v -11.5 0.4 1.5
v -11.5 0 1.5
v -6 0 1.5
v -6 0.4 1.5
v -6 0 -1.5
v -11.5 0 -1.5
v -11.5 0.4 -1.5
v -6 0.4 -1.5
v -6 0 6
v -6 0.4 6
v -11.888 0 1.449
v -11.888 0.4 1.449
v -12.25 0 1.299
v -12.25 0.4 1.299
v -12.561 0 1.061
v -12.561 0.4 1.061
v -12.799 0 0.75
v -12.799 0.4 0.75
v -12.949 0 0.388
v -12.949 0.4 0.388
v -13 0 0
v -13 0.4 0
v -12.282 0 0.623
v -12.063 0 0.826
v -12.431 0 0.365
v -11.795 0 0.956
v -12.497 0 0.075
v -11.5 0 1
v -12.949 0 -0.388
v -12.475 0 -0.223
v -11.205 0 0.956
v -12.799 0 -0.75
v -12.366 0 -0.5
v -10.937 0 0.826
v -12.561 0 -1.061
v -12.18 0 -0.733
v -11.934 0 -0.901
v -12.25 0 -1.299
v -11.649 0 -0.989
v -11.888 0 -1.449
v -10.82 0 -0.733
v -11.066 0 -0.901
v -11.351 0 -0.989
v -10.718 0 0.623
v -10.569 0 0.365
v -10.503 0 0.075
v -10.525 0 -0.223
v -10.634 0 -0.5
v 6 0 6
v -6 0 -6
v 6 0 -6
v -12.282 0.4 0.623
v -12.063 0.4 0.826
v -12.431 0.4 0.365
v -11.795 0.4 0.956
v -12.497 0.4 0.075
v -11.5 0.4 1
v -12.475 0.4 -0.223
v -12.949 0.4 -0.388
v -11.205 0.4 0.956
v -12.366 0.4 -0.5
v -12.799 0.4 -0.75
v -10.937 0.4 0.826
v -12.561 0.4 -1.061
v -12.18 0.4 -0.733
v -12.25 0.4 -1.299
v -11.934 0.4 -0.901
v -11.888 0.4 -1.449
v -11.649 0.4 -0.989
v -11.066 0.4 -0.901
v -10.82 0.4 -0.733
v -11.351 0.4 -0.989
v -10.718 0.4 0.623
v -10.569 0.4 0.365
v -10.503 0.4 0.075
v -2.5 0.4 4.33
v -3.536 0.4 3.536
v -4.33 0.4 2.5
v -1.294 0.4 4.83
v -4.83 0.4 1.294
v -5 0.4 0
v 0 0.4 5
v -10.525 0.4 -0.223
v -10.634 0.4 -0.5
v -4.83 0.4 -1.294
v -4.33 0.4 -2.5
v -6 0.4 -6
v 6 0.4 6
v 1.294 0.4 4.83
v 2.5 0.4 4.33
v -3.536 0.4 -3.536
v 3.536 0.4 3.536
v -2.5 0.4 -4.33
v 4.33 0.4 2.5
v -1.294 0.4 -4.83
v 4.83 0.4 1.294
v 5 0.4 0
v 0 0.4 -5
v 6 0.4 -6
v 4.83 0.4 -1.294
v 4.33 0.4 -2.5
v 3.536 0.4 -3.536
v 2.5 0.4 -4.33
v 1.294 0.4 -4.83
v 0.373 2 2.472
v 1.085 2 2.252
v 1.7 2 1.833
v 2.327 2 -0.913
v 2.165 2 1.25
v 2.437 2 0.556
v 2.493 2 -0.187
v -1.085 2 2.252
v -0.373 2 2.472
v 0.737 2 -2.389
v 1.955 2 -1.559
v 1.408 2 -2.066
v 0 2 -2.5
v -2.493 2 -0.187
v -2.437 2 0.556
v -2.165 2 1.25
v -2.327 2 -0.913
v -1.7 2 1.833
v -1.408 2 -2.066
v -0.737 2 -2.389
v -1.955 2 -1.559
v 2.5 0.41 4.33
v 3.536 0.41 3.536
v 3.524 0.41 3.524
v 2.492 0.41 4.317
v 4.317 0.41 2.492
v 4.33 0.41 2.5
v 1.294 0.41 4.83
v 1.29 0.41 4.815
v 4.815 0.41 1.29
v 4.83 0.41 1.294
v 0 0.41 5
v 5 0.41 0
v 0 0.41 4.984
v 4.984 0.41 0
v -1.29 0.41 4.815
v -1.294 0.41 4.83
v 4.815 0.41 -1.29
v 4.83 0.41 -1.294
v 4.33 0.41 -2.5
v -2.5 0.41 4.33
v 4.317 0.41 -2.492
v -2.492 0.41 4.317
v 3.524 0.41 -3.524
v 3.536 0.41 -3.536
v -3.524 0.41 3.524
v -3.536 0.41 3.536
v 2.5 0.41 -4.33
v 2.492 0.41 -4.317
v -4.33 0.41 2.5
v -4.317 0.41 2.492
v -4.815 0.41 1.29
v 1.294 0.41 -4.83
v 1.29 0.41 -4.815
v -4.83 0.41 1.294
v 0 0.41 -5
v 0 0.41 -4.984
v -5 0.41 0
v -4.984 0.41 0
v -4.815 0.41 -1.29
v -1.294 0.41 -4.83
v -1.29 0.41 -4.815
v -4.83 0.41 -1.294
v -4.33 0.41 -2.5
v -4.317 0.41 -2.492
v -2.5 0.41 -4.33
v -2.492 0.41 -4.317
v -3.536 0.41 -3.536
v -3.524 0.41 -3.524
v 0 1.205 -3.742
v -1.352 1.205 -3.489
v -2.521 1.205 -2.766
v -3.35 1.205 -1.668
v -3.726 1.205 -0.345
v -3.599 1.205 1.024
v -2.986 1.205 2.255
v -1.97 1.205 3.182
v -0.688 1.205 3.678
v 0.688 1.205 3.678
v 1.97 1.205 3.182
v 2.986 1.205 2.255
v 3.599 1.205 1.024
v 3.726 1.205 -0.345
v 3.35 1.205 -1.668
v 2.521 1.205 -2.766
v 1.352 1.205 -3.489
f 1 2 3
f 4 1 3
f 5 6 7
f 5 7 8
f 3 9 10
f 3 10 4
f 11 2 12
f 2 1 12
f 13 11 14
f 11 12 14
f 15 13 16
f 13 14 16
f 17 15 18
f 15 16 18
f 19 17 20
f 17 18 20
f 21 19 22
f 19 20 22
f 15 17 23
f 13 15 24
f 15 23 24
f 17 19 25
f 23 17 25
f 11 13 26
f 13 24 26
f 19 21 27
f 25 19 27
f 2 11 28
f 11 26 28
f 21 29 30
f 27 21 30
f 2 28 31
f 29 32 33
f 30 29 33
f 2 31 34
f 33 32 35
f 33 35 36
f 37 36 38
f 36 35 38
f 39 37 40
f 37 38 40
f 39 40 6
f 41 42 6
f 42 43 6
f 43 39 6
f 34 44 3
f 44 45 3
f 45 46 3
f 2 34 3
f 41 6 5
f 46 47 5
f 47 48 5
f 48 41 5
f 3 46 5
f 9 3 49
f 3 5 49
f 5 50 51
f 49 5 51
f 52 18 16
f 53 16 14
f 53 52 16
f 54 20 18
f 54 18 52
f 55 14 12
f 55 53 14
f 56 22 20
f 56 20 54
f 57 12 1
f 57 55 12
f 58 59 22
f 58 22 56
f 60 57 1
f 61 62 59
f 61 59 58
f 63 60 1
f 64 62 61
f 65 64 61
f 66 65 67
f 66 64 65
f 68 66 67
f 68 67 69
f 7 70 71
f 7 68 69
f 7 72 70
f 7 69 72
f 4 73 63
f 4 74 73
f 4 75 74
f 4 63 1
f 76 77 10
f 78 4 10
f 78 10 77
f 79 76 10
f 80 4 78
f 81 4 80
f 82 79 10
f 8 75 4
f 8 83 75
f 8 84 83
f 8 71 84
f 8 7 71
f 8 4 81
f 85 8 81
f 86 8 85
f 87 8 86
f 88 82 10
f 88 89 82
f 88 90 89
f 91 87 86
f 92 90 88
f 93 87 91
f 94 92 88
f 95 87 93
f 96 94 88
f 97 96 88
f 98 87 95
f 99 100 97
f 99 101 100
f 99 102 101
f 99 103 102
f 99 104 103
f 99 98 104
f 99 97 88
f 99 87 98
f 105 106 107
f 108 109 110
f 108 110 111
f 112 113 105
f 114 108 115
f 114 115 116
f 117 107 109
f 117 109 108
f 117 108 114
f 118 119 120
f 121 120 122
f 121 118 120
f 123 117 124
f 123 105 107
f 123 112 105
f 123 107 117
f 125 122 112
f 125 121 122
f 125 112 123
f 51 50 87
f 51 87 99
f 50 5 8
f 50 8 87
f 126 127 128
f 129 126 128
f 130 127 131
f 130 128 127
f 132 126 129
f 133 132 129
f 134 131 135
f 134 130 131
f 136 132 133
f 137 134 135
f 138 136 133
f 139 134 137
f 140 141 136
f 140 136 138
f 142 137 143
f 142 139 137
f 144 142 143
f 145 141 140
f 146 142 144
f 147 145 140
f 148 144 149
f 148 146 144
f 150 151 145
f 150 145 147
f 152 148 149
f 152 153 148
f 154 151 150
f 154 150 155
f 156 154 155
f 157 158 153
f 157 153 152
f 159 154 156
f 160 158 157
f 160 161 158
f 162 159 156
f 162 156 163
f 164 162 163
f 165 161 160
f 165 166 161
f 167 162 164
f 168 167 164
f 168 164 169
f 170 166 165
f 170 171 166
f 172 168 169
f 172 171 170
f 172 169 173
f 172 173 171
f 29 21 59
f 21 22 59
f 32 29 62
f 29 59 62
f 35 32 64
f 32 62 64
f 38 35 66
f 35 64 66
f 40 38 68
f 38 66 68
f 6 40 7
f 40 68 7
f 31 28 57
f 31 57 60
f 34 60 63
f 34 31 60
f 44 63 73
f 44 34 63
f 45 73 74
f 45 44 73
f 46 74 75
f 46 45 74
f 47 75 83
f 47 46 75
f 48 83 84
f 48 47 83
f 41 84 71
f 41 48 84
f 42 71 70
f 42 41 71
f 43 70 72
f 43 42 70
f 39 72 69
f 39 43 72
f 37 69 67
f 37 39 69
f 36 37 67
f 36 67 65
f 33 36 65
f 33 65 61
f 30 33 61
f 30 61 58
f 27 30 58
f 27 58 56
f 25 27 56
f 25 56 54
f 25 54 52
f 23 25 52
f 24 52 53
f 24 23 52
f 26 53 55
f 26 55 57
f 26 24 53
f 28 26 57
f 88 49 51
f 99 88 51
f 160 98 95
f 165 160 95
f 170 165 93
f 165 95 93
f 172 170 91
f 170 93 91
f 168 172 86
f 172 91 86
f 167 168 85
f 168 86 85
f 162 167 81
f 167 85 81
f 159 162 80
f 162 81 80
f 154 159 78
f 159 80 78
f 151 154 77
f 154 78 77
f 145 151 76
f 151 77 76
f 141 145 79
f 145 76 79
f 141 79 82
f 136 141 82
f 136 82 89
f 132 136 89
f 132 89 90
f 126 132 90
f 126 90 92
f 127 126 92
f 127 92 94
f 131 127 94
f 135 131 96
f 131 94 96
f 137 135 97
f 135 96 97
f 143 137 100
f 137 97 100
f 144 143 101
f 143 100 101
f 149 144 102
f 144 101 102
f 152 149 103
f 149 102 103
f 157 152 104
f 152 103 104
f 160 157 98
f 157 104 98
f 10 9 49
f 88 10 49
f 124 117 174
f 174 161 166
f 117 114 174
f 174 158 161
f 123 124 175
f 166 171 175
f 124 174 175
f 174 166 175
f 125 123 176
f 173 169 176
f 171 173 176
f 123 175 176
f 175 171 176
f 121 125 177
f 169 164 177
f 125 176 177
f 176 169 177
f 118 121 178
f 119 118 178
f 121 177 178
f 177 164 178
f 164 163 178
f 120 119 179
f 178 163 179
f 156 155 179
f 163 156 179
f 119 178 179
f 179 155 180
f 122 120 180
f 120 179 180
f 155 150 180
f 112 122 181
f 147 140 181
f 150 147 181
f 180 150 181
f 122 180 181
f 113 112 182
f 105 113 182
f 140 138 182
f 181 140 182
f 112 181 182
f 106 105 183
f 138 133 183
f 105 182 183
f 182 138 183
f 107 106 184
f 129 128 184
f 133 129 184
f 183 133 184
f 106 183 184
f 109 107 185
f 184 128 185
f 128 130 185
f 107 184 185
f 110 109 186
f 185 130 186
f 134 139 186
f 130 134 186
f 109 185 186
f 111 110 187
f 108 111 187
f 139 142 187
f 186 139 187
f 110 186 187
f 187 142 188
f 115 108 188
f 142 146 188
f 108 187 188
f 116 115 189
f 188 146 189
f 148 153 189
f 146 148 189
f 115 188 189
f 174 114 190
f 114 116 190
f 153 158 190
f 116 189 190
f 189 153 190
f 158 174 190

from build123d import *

# Parameters (mm, degrees)
SKETCH_1_W      = 12
SKETCH_1_H      = 12
SKETCH_1_W_2    = 7
SKETCH_1_H_2    = 3
SKETCH_1_R      = 1
EXTRUDE_1_DEPTH = 0.4
EXTRUDE_START   = 0.4
SKETCH_1_5_R    = 2.5
EXTRUDE_2_DEPTH = 1.6
SKETCH_1_6_R    = 5
EXTRUDE_3_DEPTH = 0.01
FILLET_1_R      = 1.5


with BuildPart() as part:
    # 草图1 → 凸台-拉伸1 (new body)
    # profile 1 of 2: a face of its own
    with BuildSketch(Plane(origin=(0, 0, 0), x_dir=(1, 0, 0), z_dir=(0, 1, 0))):
        Rectangle(SKETCH_1_W, SKETCH_1_H)
    # profile 2 of 2: a face of its own
    with BuildSketch(Plane(origin=(0, 0, 0), x_dir=(1, 0, 0), z_dir=(0, 1, 0))):
        with Locations((-9.5, 0)):
            Rectangle(SKETCH_1_W_2, SKETCH_1_H_2)
        with Locations(Location((-11.5, 0, 0), (0, 0, 270))):
            Circle(SKETCH_1_R, mode=Mode.SUBTRACT)
    extrude(amount=EXTRUDE_1_DEPTH)

    # 草图1<5> → 凸台-拉伸2 (add)
    with BuildSketch(Plane(origin=(0, 0, 0), x_dir=(1, 0, 0), z_dir=(0, 1, 0)).offset(EXTRUDE_START)):
        with Locations(Location((0, 0, 0), (0, 0, 90))):
            Circle(SKETCH_1_5_R)
    extrude(amount=EXTRUDE_2_DEPTH)

    # 草图1<6> → 凸台-拉伸3 (add)
    with BuildSketch(Plane(origin=(0, 0, 0), x_dir=(1, 0, 0), z_dir=(0, 1, 0)).offset(EXTRUDE_START)):
        with Locations(Location((0, 0, 0), (0, 0, 90))):
            Circle(SKETCH_1_6_R)
    extrude(amount=EXTRUDE_3_DEPTH)

    # loft up to a face of the part (loft_1)
    loft([Face(Wire([part.edges().sort_by_distance((-1.822421569, 2, 1.711367765))[0]])), Face(Wire([part.edges().sort_by_distance((-3.644843137, 0.4, 3.42273553))[0]]))])

    # 圆角1
    fillet_1_edges = [part.edges().sort_by_distance(p)[0] for p in [
        (-13, 0.2, 1.5),
        (-13, 0.2, -1.5),
    ]]
    fillet(fillet_1_edges, radius=FILLET_1_R - 0.0001)  # a hair under: the kernel refuses the full size


solid = part.part
